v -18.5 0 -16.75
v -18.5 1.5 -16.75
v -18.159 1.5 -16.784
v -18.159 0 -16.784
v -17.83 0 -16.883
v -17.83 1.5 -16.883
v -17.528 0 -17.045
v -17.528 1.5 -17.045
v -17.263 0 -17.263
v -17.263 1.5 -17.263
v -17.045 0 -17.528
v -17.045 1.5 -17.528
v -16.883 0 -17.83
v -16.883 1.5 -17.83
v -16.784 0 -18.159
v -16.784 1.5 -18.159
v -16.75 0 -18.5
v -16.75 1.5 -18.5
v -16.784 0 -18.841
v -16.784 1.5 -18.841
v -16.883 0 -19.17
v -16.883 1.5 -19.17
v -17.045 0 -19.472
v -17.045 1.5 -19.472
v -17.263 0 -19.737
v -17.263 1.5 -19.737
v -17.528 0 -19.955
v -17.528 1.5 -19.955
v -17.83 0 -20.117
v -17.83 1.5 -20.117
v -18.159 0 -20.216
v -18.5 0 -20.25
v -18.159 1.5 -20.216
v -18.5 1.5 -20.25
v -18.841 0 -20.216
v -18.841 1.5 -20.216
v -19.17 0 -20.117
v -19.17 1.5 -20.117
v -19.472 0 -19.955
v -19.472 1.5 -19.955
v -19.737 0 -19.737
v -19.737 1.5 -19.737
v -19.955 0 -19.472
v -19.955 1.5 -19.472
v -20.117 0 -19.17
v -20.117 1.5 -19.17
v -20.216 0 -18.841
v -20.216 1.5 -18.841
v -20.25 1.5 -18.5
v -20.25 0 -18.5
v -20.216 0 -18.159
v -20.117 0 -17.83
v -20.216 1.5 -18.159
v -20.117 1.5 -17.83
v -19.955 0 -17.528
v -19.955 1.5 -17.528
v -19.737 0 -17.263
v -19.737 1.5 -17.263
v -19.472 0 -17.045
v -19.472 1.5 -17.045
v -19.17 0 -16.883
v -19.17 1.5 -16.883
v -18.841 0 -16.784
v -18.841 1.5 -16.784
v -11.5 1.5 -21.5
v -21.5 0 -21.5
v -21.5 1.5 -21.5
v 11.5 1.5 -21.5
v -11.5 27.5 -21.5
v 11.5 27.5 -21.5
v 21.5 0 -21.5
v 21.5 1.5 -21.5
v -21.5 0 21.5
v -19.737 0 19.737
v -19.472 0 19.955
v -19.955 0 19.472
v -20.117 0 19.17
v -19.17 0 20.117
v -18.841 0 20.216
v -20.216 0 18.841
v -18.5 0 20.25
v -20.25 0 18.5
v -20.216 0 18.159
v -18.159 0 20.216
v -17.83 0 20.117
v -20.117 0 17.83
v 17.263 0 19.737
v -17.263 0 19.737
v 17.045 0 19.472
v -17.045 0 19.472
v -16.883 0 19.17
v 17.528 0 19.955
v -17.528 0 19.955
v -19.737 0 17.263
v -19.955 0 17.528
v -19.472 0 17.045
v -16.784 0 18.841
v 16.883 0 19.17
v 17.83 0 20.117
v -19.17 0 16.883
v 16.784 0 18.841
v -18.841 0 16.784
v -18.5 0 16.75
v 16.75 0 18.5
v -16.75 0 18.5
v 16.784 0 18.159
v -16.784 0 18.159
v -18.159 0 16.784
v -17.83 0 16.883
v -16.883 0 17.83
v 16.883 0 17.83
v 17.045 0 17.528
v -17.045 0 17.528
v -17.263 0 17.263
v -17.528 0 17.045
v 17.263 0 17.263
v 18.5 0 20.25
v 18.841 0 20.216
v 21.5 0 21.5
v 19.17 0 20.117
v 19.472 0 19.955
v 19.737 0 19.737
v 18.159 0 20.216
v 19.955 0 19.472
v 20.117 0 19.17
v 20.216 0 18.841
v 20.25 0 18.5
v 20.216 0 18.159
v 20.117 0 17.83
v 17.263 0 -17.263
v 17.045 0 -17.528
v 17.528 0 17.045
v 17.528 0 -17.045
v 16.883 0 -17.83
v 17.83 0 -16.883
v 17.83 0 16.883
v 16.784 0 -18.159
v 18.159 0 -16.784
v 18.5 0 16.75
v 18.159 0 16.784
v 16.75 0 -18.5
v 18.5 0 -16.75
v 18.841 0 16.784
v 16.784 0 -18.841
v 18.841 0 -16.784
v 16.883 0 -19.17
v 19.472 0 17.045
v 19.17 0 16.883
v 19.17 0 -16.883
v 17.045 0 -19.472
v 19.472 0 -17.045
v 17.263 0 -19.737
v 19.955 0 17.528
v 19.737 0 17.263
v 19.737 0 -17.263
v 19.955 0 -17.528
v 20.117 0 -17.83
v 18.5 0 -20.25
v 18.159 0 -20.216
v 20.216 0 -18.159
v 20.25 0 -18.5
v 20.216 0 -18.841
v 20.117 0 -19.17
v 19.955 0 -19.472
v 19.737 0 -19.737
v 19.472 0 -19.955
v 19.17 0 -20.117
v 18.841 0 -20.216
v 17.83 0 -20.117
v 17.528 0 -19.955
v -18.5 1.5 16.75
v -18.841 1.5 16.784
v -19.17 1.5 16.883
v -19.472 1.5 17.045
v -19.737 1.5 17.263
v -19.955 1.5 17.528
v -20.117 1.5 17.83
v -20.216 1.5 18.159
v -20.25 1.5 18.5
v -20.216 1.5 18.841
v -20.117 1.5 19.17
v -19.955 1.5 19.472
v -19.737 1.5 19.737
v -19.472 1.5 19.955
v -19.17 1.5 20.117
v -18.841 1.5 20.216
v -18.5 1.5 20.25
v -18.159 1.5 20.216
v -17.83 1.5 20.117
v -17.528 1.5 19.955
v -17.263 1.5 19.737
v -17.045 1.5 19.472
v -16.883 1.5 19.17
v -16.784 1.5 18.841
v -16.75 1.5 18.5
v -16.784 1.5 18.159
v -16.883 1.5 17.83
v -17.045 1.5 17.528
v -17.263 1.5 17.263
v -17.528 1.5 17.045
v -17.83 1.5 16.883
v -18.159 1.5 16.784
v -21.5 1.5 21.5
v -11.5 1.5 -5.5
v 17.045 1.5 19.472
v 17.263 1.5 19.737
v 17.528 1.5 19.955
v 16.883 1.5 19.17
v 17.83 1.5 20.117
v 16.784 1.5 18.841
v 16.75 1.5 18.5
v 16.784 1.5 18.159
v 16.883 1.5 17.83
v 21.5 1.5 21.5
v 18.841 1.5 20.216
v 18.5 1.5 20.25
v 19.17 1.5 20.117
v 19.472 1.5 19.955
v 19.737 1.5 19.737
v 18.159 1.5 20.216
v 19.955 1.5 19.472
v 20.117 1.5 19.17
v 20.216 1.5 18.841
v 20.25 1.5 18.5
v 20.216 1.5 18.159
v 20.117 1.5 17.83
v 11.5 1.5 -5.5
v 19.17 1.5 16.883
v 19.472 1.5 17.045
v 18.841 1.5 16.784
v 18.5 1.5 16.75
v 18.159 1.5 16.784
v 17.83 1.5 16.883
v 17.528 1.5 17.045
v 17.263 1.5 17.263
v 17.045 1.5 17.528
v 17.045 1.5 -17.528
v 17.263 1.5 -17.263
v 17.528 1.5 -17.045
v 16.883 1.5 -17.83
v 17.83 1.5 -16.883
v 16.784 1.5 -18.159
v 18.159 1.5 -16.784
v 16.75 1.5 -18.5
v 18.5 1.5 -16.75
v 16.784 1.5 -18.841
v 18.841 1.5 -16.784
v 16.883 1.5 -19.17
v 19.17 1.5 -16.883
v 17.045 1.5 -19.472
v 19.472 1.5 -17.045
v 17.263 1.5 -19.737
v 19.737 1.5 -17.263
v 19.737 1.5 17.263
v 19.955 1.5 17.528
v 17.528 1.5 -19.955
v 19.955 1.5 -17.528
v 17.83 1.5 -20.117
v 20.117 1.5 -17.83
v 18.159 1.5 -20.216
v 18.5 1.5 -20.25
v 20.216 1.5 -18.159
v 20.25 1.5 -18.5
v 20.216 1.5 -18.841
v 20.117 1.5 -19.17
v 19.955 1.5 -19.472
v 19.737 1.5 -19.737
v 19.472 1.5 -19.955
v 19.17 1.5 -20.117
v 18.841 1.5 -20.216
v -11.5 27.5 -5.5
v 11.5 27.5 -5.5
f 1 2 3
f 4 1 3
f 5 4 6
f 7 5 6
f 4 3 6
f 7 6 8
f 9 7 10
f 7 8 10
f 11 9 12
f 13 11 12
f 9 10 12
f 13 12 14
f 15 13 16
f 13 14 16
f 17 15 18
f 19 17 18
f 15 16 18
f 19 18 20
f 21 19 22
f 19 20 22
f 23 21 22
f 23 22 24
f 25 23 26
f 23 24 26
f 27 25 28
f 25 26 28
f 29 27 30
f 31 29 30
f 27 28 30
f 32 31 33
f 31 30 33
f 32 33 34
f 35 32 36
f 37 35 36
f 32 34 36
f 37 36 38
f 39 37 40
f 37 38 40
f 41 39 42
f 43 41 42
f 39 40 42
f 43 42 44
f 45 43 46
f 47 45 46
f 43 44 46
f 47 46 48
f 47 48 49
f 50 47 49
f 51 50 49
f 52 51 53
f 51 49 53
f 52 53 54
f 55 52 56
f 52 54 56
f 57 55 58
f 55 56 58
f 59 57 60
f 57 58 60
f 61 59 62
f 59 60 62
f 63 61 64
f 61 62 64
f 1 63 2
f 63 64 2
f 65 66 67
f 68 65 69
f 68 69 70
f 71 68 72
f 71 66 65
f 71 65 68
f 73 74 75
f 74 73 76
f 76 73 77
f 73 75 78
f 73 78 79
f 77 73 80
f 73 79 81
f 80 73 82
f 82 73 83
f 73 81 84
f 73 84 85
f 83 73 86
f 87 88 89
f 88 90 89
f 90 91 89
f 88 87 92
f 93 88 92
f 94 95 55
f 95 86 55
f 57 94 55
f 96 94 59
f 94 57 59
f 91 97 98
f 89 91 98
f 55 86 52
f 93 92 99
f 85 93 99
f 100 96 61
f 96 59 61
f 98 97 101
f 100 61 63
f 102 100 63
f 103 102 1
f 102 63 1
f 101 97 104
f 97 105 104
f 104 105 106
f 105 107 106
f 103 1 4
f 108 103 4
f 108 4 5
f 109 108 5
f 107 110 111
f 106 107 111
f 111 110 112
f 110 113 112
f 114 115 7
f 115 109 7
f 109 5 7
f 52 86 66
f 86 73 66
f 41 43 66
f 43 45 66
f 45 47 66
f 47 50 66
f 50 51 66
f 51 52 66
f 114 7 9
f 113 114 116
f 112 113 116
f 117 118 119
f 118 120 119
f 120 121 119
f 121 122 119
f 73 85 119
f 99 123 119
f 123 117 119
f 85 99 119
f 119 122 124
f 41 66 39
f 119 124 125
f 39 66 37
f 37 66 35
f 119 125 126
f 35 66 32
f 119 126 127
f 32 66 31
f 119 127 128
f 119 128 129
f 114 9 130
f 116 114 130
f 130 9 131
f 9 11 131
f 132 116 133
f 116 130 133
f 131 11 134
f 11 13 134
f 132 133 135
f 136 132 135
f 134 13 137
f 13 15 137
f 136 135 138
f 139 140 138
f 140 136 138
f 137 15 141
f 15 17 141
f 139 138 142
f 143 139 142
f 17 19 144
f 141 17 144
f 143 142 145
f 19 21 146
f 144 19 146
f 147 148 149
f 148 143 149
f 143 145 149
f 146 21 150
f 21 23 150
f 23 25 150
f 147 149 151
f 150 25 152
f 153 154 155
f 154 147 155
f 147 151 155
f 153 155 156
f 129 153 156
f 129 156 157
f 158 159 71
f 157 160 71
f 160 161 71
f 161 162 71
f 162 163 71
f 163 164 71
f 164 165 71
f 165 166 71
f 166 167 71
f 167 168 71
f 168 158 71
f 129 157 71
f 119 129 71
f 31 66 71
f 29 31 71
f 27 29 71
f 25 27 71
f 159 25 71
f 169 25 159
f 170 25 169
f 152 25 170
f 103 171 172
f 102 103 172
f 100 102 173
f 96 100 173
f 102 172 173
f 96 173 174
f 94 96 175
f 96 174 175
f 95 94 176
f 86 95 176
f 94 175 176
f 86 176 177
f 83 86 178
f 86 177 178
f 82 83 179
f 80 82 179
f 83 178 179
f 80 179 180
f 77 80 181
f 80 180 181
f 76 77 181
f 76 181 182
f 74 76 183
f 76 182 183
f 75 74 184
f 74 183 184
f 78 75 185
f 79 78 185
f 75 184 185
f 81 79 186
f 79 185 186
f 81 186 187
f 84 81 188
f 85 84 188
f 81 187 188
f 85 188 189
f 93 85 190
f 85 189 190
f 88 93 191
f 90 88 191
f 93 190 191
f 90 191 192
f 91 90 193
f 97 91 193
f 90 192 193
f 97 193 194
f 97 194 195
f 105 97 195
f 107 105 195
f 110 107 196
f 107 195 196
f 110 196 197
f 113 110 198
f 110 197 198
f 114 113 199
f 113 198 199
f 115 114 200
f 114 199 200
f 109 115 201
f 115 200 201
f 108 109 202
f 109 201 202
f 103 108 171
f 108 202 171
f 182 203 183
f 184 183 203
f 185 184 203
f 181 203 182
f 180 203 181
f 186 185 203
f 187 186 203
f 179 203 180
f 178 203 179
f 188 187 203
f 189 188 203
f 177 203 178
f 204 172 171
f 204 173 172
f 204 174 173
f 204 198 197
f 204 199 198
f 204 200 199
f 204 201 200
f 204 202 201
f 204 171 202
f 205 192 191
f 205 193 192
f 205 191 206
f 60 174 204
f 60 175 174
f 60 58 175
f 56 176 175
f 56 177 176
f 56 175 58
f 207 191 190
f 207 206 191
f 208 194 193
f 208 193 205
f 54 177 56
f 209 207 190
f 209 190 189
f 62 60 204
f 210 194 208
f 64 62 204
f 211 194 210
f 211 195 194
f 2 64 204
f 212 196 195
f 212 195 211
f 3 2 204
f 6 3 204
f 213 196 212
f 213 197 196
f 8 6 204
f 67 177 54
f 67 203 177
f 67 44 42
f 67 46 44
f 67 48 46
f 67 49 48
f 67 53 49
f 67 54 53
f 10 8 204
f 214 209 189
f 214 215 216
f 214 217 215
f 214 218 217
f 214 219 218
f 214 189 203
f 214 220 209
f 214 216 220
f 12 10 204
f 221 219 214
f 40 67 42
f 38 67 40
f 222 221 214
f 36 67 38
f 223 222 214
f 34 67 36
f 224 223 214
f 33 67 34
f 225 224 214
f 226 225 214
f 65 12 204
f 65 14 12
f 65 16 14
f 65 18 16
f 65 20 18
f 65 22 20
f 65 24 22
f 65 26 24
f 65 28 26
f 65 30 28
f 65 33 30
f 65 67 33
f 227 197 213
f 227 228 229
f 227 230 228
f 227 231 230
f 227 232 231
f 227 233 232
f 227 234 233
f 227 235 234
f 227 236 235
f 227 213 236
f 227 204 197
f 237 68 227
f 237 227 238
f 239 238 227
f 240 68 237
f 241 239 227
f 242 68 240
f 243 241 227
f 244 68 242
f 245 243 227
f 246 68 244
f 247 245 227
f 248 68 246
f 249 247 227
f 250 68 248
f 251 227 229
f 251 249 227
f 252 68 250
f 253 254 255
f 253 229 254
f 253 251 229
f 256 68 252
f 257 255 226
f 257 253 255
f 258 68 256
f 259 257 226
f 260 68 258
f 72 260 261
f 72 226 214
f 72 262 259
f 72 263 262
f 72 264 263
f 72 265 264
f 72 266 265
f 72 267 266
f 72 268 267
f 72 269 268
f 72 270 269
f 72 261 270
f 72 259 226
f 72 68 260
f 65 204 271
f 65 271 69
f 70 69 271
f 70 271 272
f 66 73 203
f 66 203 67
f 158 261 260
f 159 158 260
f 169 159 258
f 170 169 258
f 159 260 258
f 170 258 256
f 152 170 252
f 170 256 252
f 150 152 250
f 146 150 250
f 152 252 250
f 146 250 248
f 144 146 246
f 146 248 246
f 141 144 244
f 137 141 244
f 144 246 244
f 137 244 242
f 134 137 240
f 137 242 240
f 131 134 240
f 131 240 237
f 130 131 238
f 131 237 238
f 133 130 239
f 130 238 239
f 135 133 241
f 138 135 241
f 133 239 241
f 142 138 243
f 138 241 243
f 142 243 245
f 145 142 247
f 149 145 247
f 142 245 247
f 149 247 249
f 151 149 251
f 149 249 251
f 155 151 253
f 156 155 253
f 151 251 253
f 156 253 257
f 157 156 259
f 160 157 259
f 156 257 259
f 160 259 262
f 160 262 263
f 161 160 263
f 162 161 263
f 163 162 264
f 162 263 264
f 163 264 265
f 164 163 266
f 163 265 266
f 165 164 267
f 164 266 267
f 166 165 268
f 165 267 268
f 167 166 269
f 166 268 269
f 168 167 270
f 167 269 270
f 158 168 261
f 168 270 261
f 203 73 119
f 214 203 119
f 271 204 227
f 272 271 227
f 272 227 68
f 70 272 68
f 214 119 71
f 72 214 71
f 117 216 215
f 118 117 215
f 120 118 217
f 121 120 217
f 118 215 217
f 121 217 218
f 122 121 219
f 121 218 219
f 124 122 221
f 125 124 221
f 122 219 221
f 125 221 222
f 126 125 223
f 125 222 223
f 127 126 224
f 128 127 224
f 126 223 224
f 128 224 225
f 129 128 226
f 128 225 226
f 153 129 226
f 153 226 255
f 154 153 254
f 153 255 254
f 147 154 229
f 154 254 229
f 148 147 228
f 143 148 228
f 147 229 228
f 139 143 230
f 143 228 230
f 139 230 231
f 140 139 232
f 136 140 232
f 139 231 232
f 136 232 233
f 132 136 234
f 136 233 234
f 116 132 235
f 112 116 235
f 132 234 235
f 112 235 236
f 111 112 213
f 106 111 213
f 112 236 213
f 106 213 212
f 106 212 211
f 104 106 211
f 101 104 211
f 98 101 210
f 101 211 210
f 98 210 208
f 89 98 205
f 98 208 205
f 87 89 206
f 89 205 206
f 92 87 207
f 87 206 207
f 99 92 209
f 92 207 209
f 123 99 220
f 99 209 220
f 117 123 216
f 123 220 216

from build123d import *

# Parameters (mm, degrees)
SKETCH_1_W          = 43
SKETCH_1_H          = 43
EXTRUDE_1_DEPTH     = 1.5
SKETCH_2_R          = 1.75
CUT_EXTRUDE_1_DEPTH = 1.5
SKETCH_3_W          = 23
SKETCH_3_H          = 16
EXTRUDE_2_DEPTH     = 26


with BuildPart() as part:
    # 草图1 → 凸台-拉伸1 (new body)
    with BuildSketch(Plane(origin=(0, 0, 0), x_dir=(1, 0, 0), z_dir=(0, 1, 0))):
        Rectangle(SKETCH_1_W, SKETCH_1_H)
    extrude(amount=EXTRUDE_1_DEPTH)

    # 草图2 → 切除-拉伸1 (cut)
    with BuildSketch(Plane(origin=(0, 1.5, 0), x_dir=(1, 0, 0), z_dir=(0, 1, 0))):
        with Locations(Location((-18.5, 18.5, 0), (0, 0, 270))):
            Circle(SKETCH_2_R)
        with Locations(Location((18.5, 18.5, 0), (0, 0, 90))):
            Circle(SKETCH_2_R)
        with Locations(Location((-18.5, -18.5, 0), (0, 0, 90))):
            Circle(SKETCH_2_R)
        with Locations(Location((18.5, -18.5, 0), (0, 0, 270))):
            Circle(SKETCH_2_R)
    extrude(amount=-CUT_EXTRUDE_1_DEPTH, mode=Mode.SUBTRACT)

    # 草图3 → 凸台-拉伸2 (add)
    with BuildSketch(Plane(origin=(0, 1.5, 0), x_dir=(1, 0, 0), z_dir=(0, 1, 0))):
        with Locations((0, 13.5)):
            Rectangle(SKETCH_3_W, SKETCH_3_H)
    extrude(amount=EXTRUDE_2_DEPTH)


solid = part.part
